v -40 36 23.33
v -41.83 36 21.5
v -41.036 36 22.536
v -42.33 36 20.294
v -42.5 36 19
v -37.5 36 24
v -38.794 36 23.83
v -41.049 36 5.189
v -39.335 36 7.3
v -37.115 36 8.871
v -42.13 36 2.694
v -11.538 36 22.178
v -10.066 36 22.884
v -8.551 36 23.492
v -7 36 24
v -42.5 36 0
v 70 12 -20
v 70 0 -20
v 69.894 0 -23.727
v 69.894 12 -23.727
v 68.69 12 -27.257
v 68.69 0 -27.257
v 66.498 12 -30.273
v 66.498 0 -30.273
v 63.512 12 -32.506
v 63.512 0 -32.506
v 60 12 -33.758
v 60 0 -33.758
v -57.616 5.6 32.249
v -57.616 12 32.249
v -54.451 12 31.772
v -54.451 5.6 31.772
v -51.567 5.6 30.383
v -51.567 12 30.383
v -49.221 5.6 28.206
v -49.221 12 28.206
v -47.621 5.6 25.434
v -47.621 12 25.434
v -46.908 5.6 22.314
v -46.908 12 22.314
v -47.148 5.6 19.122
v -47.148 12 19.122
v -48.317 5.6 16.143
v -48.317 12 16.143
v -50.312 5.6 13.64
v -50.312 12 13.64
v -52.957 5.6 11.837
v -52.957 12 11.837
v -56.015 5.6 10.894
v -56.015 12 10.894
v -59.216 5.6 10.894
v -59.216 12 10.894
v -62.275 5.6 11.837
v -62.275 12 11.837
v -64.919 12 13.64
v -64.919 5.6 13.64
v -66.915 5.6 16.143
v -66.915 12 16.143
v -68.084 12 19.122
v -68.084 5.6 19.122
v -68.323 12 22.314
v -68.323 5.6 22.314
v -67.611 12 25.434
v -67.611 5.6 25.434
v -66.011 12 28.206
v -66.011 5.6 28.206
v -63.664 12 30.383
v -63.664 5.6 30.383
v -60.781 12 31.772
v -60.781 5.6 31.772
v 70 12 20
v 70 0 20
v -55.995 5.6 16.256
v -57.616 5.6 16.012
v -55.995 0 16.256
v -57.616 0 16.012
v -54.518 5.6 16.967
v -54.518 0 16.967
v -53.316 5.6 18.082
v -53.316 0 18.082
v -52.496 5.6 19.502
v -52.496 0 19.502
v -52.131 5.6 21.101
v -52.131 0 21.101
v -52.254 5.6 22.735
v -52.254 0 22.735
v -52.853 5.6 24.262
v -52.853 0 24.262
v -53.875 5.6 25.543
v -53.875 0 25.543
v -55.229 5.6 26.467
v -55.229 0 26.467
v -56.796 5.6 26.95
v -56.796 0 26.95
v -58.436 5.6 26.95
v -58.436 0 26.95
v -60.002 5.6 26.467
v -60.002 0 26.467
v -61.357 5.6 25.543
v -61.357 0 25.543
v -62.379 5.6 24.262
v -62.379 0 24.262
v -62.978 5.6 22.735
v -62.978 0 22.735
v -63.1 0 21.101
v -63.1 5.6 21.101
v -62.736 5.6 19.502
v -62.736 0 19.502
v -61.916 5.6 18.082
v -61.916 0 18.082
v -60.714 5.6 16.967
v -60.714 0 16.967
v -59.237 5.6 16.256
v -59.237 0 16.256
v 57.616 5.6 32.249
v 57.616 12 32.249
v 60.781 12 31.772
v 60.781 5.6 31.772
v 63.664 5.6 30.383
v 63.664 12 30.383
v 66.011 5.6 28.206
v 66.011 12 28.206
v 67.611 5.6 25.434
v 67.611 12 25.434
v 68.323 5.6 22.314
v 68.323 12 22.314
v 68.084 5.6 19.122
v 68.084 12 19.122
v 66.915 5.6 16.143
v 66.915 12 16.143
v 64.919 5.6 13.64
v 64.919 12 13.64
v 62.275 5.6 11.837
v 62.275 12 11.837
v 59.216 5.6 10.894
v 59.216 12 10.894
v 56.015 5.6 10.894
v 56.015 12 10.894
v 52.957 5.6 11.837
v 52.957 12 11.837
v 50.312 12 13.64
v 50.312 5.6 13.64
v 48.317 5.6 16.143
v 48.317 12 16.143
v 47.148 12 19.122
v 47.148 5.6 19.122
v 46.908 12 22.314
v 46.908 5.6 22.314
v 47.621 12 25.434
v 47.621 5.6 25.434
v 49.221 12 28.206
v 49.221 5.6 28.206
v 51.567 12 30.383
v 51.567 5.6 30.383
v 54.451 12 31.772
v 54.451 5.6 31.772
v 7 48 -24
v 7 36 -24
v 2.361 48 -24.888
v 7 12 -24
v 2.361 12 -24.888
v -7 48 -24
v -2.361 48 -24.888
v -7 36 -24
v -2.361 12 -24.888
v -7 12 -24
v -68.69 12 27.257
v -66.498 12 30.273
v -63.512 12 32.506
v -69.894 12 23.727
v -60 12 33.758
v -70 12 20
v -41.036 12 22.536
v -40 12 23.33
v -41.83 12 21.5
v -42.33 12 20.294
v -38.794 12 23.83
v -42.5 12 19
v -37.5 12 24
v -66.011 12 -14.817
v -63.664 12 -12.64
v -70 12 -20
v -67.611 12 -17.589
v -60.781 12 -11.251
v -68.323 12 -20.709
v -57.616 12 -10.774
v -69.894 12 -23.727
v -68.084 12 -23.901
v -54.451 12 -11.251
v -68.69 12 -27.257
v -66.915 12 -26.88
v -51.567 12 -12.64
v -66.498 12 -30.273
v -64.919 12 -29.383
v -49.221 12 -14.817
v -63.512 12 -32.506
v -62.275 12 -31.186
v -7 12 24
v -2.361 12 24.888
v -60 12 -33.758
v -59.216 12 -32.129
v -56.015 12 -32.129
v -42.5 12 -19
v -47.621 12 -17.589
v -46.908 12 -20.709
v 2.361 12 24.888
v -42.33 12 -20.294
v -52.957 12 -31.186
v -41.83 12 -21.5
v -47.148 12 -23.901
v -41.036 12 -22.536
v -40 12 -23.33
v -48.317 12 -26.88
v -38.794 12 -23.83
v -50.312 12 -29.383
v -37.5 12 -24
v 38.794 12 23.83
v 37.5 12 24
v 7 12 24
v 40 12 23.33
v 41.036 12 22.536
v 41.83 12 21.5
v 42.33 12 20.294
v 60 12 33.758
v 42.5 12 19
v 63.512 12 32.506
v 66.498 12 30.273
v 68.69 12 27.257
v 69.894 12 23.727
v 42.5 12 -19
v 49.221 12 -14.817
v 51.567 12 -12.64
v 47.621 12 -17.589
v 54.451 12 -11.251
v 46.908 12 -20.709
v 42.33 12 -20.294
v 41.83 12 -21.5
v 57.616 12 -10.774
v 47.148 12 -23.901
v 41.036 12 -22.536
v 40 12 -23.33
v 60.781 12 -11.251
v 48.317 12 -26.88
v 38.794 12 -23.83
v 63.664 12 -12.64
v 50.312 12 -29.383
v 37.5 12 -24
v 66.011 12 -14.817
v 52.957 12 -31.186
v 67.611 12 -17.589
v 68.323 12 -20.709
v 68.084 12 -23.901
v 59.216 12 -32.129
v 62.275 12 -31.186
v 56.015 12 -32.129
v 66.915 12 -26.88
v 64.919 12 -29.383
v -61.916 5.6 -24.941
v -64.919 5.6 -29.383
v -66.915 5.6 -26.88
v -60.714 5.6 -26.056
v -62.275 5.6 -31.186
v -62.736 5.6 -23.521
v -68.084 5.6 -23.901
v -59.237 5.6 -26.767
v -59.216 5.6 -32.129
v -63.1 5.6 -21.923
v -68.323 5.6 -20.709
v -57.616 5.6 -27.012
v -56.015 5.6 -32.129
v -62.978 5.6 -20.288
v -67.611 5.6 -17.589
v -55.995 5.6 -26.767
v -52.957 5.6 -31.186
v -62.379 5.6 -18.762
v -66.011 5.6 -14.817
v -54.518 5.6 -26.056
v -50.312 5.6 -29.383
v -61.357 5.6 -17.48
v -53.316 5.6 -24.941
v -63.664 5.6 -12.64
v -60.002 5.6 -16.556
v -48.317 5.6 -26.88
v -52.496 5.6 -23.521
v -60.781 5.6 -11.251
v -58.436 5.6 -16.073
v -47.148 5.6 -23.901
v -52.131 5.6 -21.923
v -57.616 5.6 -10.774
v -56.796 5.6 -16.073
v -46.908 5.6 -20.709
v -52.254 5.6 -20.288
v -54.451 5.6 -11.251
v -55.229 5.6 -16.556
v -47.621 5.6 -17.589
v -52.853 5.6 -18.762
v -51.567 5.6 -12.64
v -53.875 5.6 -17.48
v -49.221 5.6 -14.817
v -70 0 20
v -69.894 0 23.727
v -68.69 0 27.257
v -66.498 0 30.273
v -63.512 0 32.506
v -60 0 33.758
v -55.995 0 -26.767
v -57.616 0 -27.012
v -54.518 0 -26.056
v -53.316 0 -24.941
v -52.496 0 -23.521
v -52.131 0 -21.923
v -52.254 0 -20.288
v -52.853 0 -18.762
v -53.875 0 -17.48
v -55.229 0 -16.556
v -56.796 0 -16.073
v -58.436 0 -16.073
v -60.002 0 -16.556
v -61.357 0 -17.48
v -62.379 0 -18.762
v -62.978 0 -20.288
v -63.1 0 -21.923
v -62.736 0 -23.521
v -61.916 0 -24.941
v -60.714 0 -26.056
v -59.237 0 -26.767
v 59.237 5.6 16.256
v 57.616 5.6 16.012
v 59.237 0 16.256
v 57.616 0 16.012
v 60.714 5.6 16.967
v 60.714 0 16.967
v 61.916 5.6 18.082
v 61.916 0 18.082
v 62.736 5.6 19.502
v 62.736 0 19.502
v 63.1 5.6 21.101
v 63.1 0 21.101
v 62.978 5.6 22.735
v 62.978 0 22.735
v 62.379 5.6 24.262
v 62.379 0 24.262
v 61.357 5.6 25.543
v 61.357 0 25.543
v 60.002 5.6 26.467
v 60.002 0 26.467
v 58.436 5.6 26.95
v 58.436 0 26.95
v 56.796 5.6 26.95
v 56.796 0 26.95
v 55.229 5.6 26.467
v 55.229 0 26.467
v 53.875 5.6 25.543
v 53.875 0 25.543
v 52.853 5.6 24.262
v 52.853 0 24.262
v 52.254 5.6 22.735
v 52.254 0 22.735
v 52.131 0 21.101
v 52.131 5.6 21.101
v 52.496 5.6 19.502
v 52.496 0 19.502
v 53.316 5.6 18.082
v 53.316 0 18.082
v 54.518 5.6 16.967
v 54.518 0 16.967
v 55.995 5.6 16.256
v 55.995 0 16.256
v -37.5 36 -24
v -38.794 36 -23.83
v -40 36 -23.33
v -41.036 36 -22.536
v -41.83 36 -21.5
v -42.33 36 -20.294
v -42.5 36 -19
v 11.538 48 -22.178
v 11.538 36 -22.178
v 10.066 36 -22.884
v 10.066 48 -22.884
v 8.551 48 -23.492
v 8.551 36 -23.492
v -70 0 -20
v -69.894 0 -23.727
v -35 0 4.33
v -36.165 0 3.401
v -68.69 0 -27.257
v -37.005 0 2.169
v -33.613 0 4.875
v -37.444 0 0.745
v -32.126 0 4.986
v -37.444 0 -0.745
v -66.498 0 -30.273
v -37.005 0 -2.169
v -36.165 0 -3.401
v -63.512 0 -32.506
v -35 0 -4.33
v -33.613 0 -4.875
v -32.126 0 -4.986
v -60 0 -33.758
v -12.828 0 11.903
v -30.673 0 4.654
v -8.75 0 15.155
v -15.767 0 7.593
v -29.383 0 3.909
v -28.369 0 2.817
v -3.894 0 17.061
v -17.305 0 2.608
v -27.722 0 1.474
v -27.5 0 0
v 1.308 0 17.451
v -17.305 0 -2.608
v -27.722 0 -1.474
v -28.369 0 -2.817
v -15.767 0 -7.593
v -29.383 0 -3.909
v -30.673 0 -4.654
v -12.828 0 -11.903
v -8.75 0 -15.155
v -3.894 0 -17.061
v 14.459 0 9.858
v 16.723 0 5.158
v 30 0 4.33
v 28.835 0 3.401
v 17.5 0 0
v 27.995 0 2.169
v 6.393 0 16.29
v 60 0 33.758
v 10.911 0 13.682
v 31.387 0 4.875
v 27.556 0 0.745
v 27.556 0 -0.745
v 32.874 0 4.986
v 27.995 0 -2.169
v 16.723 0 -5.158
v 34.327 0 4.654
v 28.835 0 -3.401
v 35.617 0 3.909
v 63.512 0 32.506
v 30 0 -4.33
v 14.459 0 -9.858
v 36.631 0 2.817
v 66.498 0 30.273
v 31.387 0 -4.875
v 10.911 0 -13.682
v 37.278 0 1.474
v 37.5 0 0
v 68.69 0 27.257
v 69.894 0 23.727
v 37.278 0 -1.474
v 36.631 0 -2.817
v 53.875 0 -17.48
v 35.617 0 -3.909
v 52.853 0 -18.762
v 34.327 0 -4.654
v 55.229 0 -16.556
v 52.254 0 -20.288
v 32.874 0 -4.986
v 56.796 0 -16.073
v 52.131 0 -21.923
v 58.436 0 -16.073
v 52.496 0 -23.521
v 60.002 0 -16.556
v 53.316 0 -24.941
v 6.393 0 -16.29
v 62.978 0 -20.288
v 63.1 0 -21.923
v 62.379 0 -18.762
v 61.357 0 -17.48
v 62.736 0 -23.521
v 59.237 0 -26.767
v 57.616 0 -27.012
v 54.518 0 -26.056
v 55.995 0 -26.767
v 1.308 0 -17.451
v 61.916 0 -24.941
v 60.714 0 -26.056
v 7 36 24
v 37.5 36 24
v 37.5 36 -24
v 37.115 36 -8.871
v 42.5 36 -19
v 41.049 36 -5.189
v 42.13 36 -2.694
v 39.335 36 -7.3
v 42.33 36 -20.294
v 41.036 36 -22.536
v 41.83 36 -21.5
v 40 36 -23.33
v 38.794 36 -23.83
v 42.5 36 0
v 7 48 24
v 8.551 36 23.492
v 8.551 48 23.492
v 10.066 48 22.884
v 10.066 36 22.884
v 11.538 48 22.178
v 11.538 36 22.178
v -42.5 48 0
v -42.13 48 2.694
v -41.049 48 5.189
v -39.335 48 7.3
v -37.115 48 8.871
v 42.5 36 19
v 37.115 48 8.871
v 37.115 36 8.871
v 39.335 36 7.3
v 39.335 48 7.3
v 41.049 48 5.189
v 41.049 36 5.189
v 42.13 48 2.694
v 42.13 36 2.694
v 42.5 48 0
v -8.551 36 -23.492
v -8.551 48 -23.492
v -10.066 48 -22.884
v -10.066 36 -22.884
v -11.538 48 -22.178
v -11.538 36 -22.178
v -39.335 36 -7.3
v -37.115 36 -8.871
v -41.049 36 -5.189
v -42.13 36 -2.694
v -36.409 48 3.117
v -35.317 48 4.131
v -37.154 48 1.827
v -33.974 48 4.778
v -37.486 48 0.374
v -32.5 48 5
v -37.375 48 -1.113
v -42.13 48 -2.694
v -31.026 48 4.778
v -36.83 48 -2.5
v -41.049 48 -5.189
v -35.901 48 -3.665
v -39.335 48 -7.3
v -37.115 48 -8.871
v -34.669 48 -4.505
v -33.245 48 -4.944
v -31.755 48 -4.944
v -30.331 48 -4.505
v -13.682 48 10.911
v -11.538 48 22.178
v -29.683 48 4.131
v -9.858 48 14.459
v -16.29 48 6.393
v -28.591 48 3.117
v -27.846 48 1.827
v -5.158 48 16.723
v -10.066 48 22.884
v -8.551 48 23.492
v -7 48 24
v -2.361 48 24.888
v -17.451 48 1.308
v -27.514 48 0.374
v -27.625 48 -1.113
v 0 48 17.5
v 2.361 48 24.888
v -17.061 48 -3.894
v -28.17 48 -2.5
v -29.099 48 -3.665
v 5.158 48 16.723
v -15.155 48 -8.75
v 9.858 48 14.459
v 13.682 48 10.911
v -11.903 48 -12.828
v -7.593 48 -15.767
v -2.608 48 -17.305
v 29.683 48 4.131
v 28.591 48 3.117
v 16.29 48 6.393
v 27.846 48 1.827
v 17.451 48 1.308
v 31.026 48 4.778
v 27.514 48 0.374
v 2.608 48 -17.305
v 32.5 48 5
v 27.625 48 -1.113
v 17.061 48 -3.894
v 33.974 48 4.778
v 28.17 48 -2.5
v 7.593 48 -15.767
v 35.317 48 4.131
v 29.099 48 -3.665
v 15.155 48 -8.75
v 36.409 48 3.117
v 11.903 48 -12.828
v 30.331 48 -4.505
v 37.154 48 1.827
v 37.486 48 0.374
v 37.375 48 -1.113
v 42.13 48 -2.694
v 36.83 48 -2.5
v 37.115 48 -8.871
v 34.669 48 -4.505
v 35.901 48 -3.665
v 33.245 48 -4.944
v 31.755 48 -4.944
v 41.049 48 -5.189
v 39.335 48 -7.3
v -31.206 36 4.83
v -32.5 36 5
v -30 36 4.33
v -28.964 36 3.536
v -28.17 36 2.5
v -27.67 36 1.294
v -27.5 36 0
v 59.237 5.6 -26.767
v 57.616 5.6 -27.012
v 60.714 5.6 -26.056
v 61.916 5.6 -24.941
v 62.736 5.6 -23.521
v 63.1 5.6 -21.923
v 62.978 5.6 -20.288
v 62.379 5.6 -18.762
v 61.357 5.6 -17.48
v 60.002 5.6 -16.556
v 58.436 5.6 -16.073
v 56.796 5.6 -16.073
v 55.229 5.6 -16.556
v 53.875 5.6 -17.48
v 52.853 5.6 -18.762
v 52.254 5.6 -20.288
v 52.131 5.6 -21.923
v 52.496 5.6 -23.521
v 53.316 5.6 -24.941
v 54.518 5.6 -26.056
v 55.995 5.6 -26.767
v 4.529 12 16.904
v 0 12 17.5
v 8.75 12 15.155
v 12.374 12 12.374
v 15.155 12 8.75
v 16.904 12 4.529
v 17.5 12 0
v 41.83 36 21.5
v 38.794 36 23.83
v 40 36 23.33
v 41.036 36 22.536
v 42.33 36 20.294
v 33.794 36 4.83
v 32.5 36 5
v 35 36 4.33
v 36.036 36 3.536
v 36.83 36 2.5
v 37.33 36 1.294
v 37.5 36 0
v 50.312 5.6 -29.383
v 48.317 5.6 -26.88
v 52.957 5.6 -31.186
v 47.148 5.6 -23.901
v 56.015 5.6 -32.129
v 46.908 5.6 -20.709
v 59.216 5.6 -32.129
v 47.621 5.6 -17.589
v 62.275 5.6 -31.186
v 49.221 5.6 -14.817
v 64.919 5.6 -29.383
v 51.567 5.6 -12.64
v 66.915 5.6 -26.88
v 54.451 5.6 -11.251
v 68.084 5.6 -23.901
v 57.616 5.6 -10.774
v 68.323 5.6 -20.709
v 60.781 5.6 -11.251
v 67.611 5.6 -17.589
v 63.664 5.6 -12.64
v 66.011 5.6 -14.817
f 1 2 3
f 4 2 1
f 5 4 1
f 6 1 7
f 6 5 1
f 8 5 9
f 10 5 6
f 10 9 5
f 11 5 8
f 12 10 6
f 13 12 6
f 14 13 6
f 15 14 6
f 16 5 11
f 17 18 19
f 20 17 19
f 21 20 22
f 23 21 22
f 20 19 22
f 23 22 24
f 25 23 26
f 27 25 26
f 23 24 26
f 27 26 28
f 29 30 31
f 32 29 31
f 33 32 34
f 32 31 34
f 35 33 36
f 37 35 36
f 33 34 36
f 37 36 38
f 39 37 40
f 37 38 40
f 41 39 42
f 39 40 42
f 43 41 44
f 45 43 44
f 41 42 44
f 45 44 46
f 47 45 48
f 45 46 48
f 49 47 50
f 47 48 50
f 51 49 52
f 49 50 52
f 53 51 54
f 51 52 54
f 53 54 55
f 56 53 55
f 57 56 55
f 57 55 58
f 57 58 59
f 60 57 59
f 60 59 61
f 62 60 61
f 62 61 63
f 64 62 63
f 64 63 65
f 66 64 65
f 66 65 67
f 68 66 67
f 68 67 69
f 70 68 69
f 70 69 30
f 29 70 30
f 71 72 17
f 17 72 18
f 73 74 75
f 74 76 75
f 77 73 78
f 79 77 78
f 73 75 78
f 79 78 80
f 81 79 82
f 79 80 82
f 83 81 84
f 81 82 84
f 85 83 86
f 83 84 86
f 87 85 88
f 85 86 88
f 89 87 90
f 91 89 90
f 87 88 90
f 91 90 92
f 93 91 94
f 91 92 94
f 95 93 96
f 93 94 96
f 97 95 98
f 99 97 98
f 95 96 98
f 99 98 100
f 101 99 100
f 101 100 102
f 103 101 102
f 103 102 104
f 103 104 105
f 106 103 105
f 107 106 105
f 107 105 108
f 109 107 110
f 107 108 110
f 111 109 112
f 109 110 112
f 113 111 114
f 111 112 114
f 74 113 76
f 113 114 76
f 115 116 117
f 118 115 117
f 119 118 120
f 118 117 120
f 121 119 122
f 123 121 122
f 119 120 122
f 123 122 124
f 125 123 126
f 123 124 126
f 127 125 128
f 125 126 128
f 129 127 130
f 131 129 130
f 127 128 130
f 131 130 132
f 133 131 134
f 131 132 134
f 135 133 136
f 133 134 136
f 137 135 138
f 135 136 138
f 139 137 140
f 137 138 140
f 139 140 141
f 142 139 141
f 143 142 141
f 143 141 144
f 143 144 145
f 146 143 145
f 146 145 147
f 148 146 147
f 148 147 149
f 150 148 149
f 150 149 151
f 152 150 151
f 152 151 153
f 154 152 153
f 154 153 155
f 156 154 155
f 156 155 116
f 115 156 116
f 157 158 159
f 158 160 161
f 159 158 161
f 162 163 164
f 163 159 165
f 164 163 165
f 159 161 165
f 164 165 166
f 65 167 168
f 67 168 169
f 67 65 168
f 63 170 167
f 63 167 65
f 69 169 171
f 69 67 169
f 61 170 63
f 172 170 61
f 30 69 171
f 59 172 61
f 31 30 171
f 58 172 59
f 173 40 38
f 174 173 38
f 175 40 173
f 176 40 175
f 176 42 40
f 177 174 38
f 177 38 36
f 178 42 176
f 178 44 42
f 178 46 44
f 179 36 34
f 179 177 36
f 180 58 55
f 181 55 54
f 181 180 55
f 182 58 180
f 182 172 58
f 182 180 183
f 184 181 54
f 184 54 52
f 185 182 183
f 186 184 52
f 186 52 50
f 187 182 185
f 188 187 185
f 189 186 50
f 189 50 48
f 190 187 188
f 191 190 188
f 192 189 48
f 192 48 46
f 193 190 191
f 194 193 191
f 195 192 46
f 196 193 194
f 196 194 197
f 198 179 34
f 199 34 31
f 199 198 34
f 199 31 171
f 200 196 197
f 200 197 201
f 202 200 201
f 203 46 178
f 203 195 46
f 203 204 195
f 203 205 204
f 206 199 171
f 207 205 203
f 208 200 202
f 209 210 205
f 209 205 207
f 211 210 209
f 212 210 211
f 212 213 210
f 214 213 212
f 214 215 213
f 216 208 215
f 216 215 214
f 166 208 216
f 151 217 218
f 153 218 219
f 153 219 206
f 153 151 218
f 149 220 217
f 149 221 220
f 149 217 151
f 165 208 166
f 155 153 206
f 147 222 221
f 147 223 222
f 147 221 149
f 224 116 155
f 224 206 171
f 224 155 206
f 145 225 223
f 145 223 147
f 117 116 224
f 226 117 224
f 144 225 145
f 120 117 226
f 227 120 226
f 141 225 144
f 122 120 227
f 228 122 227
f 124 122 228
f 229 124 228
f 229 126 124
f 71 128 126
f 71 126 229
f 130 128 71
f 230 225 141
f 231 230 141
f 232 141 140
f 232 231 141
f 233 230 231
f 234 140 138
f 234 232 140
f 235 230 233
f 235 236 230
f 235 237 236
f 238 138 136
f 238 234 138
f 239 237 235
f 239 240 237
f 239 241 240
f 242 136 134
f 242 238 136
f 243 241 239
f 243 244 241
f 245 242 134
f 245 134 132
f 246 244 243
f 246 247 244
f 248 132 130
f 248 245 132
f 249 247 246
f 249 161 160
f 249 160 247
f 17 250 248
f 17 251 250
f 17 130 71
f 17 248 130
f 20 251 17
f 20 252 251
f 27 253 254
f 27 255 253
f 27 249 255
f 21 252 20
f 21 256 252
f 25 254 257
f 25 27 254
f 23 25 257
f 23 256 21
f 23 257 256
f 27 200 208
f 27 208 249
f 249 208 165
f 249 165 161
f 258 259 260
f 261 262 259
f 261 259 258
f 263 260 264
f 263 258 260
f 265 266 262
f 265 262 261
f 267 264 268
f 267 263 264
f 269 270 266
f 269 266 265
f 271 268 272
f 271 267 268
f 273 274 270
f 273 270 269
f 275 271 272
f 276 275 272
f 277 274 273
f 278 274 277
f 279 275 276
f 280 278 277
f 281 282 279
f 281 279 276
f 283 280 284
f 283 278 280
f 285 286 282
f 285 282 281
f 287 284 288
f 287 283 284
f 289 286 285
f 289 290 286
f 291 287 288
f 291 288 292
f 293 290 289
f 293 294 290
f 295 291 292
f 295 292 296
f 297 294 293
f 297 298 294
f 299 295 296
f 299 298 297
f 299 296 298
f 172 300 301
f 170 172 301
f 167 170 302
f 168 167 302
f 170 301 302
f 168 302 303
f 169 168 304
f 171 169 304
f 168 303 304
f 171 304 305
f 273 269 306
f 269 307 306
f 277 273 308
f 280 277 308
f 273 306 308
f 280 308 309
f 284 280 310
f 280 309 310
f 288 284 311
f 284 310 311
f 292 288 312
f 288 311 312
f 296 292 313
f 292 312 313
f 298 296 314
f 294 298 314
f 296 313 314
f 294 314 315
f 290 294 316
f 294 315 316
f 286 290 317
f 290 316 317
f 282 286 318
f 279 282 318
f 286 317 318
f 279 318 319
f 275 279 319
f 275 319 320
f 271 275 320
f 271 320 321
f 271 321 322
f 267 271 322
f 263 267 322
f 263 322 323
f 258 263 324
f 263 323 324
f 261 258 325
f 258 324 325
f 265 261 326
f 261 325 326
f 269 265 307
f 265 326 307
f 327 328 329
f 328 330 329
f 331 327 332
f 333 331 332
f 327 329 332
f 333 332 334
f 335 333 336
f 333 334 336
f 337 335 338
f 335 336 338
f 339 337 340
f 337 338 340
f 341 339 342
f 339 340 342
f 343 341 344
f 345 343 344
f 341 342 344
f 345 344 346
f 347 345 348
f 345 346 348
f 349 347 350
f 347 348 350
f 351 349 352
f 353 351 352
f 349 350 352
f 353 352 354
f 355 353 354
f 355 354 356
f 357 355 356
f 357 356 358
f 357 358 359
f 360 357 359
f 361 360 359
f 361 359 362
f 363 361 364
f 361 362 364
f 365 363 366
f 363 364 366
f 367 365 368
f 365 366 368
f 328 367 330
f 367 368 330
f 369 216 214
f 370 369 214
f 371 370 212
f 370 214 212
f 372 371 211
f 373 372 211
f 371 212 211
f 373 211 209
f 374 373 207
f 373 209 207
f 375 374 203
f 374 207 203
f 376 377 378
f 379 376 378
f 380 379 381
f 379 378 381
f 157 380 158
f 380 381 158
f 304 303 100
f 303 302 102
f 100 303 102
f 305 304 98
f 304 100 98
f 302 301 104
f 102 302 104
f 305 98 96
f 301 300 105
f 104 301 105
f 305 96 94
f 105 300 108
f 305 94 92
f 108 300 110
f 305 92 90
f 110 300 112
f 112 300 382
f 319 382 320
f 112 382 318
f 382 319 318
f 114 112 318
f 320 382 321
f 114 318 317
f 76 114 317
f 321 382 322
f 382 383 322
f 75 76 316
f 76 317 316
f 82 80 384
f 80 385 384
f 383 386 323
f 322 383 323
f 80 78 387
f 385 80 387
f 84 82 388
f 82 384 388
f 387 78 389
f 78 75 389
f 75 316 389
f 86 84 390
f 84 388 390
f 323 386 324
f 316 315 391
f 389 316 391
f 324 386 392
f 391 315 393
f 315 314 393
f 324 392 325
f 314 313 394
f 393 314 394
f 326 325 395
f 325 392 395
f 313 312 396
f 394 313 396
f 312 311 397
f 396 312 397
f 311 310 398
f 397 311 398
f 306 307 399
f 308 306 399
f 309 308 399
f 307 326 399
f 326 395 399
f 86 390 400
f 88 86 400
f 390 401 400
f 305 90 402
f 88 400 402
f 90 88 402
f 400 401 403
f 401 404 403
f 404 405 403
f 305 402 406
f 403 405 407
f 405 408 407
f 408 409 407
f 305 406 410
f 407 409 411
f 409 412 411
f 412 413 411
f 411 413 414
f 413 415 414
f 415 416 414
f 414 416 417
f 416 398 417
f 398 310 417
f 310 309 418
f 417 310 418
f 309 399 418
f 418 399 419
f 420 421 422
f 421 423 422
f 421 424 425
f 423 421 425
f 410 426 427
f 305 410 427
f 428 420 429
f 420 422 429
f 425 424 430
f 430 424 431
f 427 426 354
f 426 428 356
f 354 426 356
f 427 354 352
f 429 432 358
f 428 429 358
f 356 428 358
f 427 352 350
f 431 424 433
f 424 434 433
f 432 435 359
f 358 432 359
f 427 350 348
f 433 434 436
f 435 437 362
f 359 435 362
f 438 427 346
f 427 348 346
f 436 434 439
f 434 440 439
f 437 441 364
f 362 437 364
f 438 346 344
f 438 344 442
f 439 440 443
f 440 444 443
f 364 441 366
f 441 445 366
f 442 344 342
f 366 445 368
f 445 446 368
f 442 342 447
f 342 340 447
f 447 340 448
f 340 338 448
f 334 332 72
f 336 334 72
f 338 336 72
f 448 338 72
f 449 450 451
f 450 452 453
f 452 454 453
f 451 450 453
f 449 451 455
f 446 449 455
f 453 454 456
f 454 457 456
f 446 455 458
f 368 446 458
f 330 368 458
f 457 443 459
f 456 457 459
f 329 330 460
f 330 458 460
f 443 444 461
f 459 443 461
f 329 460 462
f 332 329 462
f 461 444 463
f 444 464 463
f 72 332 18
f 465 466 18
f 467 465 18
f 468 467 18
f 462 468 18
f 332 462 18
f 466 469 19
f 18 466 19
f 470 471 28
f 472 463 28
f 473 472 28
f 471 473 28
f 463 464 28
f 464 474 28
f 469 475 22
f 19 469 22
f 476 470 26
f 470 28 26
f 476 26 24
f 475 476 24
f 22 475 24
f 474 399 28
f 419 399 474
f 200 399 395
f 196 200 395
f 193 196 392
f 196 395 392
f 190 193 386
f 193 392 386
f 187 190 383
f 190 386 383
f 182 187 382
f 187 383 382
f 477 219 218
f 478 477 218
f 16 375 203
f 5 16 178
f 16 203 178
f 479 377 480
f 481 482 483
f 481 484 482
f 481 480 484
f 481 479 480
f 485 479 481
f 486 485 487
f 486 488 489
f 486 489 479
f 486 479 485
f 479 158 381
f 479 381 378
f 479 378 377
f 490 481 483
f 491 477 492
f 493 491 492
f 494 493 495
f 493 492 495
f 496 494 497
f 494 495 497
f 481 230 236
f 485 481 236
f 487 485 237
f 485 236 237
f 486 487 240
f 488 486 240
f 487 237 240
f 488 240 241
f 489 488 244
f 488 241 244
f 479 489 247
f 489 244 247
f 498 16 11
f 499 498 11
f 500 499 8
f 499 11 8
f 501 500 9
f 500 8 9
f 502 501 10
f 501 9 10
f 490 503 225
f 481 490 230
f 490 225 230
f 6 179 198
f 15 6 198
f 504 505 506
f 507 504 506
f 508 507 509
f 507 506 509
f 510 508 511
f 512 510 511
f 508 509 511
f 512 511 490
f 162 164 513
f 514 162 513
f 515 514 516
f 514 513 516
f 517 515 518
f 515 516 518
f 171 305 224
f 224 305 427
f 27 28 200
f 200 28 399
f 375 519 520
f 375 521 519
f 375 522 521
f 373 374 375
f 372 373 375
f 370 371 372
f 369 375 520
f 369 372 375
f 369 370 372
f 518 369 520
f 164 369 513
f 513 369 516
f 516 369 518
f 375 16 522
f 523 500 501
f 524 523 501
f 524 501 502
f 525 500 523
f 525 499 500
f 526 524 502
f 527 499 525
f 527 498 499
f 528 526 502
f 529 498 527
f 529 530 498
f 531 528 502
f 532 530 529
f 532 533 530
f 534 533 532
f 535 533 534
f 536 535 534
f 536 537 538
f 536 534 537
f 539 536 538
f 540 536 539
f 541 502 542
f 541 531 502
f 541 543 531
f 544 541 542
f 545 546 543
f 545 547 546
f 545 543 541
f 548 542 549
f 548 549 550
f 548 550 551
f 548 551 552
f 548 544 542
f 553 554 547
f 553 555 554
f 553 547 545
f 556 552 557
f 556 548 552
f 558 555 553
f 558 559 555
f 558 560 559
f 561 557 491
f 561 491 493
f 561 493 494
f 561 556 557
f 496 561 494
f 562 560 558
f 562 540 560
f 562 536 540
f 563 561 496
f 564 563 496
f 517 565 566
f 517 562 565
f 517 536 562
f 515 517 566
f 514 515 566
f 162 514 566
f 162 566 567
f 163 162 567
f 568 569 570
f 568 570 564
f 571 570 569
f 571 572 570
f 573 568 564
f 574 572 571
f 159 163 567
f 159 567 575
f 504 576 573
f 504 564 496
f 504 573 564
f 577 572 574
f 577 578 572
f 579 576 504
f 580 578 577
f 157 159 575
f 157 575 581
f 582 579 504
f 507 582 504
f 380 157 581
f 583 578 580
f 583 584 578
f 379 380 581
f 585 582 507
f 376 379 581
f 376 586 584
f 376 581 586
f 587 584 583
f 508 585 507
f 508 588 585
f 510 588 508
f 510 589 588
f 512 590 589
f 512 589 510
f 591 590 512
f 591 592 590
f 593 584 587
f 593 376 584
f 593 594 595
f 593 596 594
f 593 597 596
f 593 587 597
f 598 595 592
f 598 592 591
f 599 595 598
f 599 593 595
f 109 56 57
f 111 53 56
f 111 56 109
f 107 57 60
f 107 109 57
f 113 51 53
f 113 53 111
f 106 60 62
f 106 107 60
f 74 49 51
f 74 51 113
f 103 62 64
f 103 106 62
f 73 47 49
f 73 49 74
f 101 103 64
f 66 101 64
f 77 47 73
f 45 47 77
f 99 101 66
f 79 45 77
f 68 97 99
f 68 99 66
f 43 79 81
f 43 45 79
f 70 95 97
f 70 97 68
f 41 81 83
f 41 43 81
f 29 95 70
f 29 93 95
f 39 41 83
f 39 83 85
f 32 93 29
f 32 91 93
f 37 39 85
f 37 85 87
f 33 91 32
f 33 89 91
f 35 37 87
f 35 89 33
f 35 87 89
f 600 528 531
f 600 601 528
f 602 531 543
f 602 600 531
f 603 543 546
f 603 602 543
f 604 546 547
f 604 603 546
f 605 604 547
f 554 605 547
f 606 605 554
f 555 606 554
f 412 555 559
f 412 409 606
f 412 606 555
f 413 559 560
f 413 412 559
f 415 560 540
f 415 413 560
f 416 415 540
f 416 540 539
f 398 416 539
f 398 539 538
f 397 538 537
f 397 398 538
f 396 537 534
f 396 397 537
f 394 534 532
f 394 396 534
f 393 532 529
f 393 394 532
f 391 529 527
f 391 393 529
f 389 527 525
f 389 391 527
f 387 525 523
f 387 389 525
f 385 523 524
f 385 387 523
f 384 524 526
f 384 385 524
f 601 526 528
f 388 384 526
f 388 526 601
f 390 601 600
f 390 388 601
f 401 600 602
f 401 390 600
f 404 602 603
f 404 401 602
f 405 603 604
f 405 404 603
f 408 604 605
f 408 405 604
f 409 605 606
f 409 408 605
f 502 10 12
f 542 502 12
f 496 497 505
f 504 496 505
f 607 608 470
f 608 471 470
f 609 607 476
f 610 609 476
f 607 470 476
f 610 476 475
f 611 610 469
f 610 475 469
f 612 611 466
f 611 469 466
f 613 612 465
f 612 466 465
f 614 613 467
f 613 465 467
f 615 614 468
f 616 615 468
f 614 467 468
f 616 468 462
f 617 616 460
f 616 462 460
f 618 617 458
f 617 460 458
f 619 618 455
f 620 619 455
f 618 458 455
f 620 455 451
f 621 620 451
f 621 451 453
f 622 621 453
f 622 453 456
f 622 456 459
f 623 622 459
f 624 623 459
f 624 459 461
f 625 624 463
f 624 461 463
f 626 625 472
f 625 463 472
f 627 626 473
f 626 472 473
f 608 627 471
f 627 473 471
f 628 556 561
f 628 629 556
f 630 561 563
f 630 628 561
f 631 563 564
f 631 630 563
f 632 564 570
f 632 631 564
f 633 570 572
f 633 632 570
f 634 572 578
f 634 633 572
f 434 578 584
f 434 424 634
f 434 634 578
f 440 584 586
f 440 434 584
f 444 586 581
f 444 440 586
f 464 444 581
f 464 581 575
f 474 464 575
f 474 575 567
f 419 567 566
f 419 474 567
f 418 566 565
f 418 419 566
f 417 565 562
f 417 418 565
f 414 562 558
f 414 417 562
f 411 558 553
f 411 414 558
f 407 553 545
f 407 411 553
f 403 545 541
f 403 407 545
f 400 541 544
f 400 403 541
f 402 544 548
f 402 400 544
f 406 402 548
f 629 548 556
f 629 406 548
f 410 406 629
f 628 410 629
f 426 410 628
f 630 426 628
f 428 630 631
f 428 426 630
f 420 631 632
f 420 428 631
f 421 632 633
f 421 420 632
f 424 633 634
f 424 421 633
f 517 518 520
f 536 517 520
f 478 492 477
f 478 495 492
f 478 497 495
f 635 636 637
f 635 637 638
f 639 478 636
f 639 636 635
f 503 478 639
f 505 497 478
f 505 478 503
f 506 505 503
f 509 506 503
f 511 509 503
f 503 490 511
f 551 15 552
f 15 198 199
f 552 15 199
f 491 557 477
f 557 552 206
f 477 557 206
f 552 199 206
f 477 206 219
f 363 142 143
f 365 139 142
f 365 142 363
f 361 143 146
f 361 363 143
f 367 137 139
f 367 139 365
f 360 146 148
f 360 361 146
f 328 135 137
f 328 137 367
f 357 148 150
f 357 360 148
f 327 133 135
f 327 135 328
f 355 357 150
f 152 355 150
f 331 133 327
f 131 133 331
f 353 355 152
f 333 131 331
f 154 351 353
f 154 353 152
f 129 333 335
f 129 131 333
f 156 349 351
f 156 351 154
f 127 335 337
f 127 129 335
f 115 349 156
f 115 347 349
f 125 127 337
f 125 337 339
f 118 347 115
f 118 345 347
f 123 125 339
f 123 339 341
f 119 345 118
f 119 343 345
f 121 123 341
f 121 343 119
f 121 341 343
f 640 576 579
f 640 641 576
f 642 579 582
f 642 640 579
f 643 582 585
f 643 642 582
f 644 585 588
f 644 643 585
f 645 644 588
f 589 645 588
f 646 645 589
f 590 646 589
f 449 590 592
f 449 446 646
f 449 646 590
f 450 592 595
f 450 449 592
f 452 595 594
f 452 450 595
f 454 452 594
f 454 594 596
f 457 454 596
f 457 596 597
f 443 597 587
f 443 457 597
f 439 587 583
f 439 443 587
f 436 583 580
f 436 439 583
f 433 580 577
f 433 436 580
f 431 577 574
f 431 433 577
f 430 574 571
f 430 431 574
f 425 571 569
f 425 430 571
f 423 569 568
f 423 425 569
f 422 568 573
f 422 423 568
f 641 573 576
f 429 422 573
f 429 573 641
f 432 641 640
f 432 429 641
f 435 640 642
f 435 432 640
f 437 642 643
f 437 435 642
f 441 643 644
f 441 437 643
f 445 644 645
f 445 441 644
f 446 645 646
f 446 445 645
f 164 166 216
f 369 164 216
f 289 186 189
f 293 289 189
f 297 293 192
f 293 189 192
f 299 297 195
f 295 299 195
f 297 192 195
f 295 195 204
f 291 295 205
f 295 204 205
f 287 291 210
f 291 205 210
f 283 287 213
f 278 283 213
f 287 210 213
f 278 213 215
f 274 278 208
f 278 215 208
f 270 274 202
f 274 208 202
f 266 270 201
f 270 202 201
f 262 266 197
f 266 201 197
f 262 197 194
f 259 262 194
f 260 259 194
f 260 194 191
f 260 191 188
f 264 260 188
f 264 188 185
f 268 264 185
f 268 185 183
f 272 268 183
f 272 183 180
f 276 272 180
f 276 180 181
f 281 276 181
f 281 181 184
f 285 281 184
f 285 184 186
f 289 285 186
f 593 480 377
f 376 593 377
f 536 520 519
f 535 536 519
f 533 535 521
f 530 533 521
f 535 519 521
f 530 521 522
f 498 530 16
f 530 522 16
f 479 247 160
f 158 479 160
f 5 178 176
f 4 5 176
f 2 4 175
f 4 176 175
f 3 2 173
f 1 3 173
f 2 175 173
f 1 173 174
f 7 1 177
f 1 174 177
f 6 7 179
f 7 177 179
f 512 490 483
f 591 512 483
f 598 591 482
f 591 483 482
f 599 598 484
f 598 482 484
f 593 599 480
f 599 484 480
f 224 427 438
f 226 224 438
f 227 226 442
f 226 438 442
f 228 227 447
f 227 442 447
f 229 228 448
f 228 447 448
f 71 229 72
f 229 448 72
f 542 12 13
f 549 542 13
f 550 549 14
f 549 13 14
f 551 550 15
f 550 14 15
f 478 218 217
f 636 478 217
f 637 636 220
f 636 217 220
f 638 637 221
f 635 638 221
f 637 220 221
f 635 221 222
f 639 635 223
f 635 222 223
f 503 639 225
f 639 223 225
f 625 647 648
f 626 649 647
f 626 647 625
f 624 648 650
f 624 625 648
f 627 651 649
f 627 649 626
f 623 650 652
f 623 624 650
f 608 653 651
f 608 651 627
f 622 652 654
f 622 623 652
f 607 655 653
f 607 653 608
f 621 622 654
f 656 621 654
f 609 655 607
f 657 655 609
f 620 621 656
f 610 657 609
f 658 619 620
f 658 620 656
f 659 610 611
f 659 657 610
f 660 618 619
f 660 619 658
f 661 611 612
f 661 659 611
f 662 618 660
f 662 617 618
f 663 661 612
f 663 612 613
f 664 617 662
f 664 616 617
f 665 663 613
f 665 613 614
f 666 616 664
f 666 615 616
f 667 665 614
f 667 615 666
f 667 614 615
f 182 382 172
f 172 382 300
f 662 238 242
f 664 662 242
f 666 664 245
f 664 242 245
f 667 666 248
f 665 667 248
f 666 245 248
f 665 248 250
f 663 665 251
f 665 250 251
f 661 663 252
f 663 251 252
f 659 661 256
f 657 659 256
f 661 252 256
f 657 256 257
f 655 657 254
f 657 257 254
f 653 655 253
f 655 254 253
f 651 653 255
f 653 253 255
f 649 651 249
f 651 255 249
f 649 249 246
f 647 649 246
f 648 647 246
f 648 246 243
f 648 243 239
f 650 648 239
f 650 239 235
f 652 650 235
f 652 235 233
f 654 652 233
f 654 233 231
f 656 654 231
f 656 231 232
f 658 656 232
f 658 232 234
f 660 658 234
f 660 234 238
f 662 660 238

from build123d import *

# Parameters (mm, degrees)
BOSS_EXTRUDE1_DEPTH                           = 12
CBORE_FOR_M10_HEX_HEAD_CAP_SCREW1_D           = 11
CBORE_FOR_M10_HEX_HEAD_CAP_SCREW1_CBORE_D     = 21.475
CBORE_FOR_M10_HEX_HEAD_CAP_SCREW1_CBORE_DEPTH = 6.4
SKETCH4_R                                     = 17.5
BOSS_EXTRUDE3_DEPTH                           = 24
SKETCH7_R                                     = 5
SKETCH7_R_2                                   = 17.5
BOSS_EXTRUDE4_DEPTH                           = 12
SKETCH8_R                                     = 17.5
SKETCH8_R_2                                   = 5
CUT_EXTRUDE2_DEPTH                            = 92.413676108


with BuildPart() as part:
    # Sketch1 → Boss-Extrude1 (new body)
    with BuildSketch(Plane(origin=(0, 0, 0), x_dir=(1, 0, 0), z_dir=(0, 1, 0))):
        with BuildLine():
            Line((-60, -33.757736606), (60, -33.757736606))
            ThreePointArc((60, -33.757736606), (67.707641844, -28.846955004), (70, -20))
            Line((70, -20), (70, 20))
            ThreePointArc((70, 20), (67.707641844, 28.846955004), (60, 33.757736606))
            Line((60, 33.757736606), (-60, 33.757736606))
            ThreePointArc((-60, 33.757736606), (-67.707641844, 28.846955004), (-70, 20))
            Line((-70, 20), (-70, -20))
            ThreePointArc((-70, -20), (-67.707641844, -28.846955004), (-60, -33.757736606))
        make_face()
    extrude(amount=BOSS_EXTRUDE1_DEPTH)

    # CBORE for M10 Hex Head Cap Screw1 (through all)
    with Locations(Plane(origin=(-57.615806102, 12, -21.511565447), x_dir=(0, 0, 1), z_dir=(0, 1, 0))):
        with Locations((0, 0), (43.023130894, 0), (43.023130894, 115.231612204), (0, 115.231612204)):
            CounterBoreHole(CBORE_FOR_M10_HEX_HEAD_CAP_SCREW1_D / 2, CBORE_FOR_M10_HEX_HEAD_CAP_SCREW1_CBORE_D / 2, CBORE_FOR_M10_HEX_HEAD_CAP_SCREW1_CBORE_DEPTH)

    # Sketch4 → Boss-Extrude3 (add)
    with BuildSketch(Plane(origin=(0, 12, 0), x_dir=(1, 0, 0), z_dir=(0, 1, 0))):
        with BuildLine():
            Line((-7, 24), (-37.5, 24))
            ThreePointArc((-37.5, 24), (-41.035533906, 22.535533906), (-42.5, 19))
            Line((-42.5, 19), (-42.5, -19))
            ThreePointArc((-42.5, -19), (-41.035533906, -22.535533906), (-37.5, -24))
            Line((-37.5, -24), (-7, -24))
            ThreePointArc((-7, -24), (0, -25), (7, -24))
            Line((7, -24), (37.5, -24))
            ThreePointArc((37.5, -24), (41.035533906, -22.535533906), (42.5, -19))
            Line((42.5, -19), (42.5, 19))
            ThreePointArc((42.5, 19), (41.035533906, 22.535533906), (37.5, 24))
            Line((37.5, 24), (7, 24))
            ThreePointArc((7, 24), (0, 25), (-7, 24))
        make_face()
        Circle(SKETCH4_R, mode=Mode.SUBTRACT)
    extrude(amount=BOSS_EXTRUDE3_DEPTH)

    # Sketch7 → Boss-Extrude4 (add)
    with BuildSketch(Plane(origin=(0, 36, 0), x_dir=(1, 0, 0), z_dir=(0, 1, 0))):
        with BuildLine():
            ThreePointArc((37.115384615, -8.871201996), (42.5, 0), (37.115384615, 8.871201996))
            Line((37.115384615, 8.871201996), (11.538461538, 22.17800499))
            ThreePointArc((11.538461538, 22.17800499), (0, 25), (-11.538461538, 22.17800499))
            Line((-11.538461538, 22.17800499), (-37.115384615, 8.871201996))
            ThreePointArc((-37.115384615, 8.871201996), (-42.5, 0), (-37.115384615, -8.871201996))
            Line((-37.115384615, -8.871201996), (-11.538461538, -22.17800499))
            ThreePointArc((-11.538461538, -22.17800499), (0, -25), (11.538461538, -22.17800499))
            Line((11.538461538, -22.17800499), (37.115384615, -8.871201996))
        make_face()
        with Locations((32.5, 0)):
            Circle(SKETCH7_R, mode=Mode.SUBTRACT)
        Circle(SKETCH7_R_2, mode=Mode.SUBTRACT)
        with Locations((-32.5, 0)):
            Circle(SKETCH7_R, mode=Mode.SUBTRACT)
    extrude(amount=BOSS_EXTRUDE4_DEPTH)

    # Sketch8 → Cut-Extrude2 (cut, through all)
    with BuildSketch(Plane(origin=(0, 48, 0), x_dir=(1, 0, 0), z_dir=(0, 1, 0))):
        Circle(SKETCH8_R)
        with Locations((32.5, 0)):
            Circle(SKETCH8_R_2)
        with Locations((-32.5, 0)):
            Circle(SKETCH8_R_2)
    extrude(amount=-CUT_EXTRUDE2_DEPTH, mode=Mode.SUBTRACT)


solid = part.part
